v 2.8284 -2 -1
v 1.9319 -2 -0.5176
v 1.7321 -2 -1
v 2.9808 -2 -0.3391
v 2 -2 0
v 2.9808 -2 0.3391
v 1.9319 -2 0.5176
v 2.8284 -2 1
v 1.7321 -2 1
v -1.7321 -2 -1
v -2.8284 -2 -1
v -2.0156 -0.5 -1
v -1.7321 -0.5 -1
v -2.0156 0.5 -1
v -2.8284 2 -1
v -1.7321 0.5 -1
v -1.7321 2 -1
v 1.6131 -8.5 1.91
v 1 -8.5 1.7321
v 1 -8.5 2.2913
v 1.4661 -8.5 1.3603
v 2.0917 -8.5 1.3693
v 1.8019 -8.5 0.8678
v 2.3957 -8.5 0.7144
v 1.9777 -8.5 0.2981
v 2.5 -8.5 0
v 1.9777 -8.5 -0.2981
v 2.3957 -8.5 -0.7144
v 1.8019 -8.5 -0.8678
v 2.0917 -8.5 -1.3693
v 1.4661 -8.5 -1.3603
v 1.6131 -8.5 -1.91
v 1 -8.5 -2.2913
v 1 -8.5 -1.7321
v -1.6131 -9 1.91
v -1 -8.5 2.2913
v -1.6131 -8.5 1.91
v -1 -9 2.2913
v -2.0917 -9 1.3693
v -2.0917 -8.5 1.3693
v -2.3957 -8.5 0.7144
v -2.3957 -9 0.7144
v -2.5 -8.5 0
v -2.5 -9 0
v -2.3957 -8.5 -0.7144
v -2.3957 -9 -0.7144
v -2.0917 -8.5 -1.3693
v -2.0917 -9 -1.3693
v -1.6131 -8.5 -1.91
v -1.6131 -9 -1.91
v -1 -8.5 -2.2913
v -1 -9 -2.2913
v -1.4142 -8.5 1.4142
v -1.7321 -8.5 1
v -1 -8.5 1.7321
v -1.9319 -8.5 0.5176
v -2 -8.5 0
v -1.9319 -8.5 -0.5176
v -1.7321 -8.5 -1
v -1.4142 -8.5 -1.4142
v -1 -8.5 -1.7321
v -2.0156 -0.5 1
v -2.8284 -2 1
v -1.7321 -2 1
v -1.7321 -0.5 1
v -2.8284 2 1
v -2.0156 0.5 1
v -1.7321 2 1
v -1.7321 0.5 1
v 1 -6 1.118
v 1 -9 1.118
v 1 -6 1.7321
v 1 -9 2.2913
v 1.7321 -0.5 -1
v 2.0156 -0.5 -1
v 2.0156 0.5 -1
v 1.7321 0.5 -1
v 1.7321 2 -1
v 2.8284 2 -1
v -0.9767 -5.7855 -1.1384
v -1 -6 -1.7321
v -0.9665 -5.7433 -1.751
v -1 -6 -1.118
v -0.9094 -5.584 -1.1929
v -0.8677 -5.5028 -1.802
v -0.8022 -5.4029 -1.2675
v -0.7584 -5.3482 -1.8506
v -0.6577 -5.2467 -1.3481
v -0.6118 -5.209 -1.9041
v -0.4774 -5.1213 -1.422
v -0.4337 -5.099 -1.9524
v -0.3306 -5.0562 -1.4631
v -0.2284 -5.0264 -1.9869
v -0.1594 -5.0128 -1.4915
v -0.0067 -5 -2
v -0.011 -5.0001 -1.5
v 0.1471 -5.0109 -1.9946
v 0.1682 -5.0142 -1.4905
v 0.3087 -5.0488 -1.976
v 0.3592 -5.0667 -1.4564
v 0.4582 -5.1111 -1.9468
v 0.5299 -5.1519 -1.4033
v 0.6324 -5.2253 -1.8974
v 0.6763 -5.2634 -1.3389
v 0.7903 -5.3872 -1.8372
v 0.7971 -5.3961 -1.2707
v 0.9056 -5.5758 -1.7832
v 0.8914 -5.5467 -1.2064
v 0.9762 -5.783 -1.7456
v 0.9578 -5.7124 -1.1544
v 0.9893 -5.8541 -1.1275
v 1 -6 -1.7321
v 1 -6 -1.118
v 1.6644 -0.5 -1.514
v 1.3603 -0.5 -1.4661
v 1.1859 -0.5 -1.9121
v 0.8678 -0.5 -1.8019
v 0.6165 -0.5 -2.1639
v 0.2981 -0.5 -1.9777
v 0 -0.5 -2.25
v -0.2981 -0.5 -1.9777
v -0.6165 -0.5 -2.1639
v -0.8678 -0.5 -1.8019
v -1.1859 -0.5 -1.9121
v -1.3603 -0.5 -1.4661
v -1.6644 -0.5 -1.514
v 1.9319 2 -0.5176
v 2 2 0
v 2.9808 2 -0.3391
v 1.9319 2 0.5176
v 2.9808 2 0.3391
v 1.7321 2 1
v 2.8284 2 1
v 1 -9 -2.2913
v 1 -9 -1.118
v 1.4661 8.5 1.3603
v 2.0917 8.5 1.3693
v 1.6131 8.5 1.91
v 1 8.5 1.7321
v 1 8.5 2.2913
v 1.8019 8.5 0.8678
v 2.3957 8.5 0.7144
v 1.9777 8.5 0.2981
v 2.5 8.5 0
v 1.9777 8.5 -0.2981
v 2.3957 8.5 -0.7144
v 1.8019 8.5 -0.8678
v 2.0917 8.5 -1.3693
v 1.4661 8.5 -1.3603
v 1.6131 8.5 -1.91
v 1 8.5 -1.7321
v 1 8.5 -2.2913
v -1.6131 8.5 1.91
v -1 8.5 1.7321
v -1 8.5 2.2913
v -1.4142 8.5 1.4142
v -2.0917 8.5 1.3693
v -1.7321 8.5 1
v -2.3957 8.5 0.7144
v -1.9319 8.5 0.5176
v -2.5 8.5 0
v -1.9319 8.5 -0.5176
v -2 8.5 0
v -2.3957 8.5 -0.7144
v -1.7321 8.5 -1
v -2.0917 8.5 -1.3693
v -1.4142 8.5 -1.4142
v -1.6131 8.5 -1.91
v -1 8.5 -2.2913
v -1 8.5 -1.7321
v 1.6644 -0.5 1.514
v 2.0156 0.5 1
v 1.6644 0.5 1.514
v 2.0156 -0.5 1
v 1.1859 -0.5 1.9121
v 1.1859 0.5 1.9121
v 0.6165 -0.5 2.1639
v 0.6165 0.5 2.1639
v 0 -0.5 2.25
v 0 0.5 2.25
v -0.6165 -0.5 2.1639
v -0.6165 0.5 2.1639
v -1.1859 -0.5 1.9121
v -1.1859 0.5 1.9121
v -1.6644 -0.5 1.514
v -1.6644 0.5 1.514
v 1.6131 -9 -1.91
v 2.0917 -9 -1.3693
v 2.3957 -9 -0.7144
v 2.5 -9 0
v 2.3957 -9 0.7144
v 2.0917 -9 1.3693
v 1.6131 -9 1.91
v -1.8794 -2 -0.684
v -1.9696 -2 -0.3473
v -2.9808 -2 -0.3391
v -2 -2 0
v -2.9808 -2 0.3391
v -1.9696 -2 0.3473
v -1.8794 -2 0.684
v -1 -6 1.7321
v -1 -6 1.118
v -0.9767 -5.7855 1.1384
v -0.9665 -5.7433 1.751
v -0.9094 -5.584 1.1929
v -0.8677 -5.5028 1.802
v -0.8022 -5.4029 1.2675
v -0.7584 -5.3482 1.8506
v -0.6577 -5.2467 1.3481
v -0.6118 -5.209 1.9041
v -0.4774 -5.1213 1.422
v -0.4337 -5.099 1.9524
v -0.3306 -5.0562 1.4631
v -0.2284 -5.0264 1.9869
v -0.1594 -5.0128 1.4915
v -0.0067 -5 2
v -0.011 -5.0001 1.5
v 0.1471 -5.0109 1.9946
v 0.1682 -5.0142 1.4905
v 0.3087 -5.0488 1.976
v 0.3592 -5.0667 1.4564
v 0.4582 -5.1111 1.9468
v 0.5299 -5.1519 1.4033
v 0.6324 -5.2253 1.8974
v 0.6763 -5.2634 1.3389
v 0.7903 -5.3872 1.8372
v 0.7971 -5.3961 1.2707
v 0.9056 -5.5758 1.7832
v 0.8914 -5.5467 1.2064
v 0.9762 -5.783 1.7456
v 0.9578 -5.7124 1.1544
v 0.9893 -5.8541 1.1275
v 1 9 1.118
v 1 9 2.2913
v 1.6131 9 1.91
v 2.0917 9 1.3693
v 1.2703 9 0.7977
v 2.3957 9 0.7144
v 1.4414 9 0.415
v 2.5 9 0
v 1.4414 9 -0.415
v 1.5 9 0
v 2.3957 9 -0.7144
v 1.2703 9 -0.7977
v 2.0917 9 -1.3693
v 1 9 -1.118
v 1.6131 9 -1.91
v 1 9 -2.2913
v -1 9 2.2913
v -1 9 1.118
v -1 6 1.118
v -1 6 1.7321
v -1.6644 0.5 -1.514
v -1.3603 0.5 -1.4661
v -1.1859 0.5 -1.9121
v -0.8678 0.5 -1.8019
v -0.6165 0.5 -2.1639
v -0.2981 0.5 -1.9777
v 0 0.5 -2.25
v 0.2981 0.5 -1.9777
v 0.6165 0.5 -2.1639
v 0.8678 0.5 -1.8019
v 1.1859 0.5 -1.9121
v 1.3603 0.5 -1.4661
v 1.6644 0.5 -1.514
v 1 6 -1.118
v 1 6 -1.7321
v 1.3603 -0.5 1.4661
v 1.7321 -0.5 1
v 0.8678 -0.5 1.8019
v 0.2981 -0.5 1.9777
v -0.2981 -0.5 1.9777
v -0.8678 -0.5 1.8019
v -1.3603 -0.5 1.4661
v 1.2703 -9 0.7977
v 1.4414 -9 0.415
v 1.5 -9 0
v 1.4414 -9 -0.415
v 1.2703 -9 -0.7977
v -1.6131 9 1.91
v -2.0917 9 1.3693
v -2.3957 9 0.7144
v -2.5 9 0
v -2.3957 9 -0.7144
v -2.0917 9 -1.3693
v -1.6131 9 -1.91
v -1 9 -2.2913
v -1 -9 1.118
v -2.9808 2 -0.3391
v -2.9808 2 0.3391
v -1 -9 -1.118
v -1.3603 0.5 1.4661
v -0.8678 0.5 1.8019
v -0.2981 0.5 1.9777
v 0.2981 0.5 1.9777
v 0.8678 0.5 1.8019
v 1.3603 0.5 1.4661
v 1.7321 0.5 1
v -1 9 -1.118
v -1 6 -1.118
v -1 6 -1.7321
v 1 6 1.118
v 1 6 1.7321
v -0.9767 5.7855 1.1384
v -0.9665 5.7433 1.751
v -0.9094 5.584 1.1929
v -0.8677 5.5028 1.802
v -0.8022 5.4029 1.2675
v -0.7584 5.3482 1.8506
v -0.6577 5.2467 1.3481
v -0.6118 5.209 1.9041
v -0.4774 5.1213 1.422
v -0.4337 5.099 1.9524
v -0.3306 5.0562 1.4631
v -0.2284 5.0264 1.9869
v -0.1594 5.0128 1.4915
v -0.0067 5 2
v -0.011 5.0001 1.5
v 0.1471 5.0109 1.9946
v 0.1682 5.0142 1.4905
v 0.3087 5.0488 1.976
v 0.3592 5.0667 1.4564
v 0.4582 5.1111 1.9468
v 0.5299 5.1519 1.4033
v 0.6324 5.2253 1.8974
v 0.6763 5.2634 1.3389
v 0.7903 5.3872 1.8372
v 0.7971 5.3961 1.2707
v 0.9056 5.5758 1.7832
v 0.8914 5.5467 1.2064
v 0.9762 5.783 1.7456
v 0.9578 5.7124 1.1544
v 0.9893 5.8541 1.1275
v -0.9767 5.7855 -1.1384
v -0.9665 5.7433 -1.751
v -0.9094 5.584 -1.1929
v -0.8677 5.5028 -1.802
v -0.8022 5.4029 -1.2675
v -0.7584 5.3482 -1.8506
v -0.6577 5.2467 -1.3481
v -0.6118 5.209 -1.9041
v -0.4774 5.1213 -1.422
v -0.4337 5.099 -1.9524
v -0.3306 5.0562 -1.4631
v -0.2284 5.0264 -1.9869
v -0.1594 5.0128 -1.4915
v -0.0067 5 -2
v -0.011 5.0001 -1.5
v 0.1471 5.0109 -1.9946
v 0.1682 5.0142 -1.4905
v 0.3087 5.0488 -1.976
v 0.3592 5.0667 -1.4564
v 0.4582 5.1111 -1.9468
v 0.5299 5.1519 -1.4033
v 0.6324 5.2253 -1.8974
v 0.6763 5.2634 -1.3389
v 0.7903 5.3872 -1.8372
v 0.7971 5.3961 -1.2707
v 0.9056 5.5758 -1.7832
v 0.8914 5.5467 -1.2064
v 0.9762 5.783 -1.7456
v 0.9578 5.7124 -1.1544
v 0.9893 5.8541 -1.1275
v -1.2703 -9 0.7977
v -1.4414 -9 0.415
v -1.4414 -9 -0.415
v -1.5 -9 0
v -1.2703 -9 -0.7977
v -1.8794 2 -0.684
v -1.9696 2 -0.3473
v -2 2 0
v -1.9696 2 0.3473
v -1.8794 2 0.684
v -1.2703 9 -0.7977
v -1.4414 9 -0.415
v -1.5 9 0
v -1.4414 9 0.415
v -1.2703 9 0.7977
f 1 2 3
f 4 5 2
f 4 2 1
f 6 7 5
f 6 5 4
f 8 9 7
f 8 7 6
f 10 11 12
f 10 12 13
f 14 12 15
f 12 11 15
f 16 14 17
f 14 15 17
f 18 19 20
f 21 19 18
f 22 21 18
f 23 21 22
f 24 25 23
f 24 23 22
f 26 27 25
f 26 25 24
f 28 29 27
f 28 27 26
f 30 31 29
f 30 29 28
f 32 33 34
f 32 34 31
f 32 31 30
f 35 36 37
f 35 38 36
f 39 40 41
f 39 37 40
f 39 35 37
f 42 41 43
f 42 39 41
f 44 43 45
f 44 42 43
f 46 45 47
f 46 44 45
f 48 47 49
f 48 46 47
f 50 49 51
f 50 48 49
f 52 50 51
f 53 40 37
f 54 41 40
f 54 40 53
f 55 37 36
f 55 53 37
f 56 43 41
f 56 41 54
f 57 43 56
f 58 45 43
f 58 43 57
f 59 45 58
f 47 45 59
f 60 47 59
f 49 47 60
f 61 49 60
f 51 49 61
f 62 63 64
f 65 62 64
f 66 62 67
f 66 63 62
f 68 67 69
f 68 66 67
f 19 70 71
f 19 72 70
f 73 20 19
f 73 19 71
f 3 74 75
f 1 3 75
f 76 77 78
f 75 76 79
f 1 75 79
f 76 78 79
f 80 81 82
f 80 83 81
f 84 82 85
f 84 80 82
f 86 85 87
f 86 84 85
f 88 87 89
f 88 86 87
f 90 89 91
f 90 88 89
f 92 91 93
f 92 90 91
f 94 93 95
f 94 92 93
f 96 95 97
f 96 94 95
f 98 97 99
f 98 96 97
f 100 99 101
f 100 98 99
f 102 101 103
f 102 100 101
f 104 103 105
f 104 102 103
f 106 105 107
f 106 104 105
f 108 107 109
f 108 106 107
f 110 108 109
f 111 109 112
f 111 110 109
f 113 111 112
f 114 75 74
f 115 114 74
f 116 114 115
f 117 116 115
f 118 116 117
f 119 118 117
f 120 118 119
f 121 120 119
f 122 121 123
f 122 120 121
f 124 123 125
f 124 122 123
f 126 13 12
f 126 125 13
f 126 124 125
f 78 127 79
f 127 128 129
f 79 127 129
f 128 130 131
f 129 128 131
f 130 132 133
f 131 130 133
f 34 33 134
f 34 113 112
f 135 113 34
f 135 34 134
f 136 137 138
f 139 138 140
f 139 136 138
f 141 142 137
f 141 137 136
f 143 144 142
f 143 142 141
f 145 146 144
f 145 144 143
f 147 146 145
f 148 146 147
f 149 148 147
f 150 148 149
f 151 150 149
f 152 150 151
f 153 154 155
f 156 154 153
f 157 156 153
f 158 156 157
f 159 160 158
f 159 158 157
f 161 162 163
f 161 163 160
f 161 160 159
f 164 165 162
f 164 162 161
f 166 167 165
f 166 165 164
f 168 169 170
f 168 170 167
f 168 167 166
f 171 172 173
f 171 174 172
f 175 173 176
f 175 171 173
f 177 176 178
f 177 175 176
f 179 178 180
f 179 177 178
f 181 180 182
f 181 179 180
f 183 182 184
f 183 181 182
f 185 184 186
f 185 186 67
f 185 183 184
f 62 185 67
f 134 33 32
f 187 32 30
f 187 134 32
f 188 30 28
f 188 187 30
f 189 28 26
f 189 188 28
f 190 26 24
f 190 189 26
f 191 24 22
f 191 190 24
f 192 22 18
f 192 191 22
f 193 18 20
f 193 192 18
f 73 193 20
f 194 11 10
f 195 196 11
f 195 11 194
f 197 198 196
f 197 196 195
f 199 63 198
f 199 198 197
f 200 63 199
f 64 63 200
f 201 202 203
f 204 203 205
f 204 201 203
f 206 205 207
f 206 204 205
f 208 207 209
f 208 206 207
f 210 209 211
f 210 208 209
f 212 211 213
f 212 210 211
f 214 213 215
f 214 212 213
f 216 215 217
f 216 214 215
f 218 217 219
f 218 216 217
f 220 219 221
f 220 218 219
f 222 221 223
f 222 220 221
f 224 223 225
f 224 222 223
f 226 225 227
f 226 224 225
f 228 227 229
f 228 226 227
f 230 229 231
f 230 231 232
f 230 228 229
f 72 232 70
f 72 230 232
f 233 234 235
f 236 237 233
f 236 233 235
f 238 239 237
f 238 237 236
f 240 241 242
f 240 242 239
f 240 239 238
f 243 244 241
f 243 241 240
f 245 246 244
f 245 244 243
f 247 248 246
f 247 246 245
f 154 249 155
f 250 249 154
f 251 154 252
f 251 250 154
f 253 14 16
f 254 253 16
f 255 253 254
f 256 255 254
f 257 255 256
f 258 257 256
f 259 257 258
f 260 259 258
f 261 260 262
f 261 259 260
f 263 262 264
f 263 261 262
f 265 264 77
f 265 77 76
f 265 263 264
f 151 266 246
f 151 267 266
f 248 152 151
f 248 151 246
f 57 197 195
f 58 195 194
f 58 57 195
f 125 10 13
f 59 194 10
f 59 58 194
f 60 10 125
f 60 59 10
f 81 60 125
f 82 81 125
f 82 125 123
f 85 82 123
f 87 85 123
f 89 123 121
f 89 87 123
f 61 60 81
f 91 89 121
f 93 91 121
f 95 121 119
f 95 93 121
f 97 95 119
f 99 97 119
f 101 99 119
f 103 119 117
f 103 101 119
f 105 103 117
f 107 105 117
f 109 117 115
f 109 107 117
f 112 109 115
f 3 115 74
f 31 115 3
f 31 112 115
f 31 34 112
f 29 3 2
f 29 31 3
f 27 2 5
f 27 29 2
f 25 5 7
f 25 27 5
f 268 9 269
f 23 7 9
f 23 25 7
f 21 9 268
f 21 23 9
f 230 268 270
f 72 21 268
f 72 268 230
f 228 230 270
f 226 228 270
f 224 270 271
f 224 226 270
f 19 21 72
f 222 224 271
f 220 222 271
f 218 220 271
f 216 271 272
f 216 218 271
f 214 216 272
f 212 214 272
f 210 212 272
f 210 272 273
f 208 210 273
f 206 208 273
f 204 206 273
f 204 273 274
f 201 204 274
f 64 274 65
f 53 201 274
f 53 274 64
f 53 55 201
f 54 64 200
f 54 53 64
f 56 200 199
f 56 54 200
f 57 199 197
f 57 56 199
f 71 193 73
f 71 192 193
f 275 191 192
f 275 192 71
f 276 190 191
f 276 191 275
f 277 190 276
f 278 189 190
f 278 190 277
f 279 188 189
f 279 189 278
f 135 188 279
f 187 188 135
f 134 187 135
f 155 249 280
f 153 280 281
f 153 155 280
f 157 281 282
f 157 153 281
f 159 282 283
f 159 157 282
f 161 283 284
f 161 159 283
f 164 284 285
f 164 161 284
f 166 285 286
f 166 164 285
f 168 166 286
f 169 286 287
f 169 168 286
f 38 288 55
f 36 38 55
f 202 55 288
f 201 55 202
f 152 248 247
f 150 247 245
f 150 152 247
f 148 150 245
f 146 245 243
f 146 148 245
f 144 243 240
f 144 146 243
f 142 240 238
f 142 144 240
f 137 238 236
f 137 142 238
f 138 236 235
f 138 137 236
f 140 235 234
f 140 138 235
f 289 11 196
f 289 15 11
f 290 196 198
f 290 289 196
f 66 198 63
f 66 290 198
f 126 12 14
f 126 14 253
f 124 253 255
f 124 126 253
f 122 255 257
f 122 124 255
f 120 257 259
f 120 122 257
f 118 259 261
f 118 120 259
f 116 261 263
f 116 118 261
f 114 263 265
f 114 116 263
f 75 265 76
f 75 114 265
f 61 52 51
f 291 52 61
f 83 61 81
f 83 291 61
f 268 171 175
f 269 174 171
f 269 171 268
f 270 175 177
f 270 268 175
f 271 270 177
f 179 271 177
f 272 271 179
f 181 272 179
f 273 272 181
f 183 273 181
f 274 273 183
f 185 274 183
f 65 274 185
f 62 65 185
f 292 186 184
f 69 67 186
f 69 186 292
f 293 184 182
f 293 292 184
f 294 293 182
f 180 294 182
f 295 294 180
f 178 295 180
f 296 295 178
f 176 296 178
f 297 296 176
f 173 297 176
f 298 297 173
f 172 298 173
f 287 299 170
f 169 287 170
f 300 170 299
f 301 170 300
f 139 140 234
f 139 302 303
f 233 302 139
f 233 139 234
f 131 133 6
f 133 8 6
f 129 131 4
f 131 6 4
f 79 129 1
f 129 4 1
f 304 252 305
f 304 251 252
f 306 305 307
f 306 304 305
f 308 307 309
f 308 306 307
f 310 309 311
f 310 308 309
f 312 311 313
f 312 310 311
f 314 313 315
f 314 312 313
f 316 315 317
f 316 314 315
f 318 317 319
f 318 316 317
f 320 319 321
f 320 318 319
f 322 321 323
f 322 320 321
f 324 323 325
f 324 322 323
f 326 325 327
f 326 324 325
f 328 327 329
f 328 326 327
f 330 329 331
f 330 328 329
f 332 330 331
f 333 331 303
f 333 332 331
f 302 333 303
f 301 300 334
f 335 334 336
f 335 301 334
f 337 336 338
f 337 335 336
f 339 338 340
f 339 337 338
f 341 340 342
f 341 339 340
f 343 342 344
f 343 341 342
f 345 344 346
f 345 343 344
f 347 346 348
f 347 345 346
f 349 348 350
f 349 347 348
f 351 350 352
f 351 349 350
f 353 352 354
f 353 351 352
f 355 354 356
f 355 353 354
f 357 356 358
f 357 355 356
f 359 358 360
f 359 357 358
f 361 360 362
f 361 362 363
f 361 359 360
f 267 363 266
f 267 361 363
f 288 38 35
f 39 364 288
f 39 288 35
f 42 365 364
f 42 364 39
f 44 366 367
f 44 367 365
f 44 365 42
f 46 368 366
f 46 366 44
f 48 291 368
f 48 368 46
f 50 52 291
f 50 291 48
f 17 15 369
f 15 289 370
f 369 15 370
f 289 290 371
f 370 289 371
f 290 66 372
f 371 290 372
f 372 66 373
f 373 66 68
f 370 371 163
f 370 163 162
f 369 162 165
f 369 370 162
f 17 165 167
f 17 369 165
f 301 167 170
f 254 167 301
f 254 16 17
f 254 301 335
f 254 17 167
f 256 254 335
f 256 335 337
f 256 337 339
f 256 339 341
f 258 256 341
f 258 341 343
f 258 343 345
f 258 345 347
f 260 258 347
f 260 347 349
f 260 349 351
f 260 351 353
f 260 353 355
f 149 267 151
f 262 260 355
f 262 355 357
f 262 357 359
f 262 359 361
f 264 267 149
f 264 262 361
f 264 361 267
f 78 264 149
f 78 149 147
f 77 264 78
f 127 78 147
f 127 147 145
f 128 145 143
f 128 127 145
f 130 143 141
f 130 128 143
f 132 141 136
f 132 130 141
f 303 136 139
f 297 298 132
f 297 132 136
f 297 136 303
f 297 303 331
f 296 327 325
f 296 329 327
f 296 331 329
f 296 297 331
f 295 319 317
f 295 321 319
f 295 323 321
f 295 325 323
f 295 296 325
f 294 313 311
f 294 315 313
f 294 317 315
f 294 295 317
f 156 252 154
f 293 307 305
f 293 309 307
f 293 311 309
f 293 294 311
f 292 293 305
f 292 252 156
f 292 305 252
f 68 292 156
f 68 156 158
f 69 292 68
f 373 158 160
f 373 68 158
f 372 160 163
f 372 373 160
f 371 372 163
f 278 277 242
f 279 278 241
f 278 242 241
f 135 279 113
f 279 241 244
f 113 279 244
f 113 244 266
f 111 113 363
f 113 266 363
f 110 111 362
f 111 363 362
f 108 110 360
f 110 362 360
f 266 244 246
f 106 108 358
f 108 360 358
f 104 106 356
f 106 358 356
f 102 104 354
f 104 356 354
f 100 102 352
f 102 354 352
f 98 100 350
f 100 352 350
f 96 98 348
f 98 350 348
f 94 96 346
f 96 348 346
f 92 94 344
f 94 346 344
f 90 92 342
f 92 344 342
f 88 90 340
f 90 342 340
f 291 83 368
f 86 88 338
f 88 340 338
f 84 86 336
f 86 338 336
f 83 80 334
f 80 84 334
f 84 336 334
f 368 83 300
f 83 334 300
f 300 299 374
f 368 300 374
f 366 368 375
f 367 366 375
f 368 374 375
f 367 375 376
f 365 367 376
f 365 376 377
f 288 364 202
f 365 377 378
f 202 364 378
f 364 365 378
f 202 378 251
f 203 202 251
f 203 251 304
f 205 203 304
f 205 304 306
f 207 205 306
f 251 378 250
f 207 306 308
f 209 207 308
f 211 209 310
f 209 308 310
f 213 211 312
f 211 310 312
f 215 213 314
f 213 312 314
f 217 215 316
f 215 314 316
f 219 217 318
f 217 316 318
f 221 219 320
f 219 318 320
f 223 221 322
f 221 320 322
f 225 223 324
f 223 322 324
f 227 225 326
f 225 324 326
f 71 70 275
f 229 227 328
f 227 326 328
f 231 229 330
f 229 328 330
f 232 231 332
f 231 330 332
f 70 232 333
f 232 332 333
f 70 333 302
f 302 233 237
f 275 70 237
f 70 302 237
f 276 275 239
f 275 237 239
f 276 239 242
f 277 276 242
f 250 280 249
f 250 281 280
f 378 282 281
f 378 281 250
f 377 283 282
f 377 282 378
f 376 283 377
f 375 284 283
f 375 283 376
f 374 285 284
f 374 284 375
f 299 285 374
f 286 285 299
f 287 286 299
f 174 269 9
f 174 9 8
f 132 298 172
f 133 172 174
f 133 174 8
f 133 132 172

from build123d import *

# Parameters (mm, degrees)
SKETCH3_W               = 6
SKETCH3_H               = 4
BOSS_EXTRUDE4_DEPTH     = 1
CUT_EXTRUDE2_DEPTH      = 3.5
CUT_EXTRUDE2_DEPTH_BACK = 3.5
SKETCH6_R               = 1.5
CUT_EXTRUDE3_DEPTH      = 18
SKETCH7_OUTSIDE_W       = 11.904
SKETCH7_OUTSIDE_H       = 10.486
SKETCH7_OUTSIDE_R       = 3
CUT_EXTRUDE4_DEPTH      = 10.0000001
CUT_EXTRUDE4_DEPTH_BACK = 10.0000001


with BuildPart() as part:
    # Sketch1 → Revolve5 (revolve)
    with BuildSketch(Plane.XY):
        Polygon((0, 9), (-2.5, 9), (-2.5, 8.5), (-2, 8.5), (-2, 0.5), (-2.25, 0.5), (-2.25, -0.5), (-2, -0.5), (-2, -8.5), (-2.5, -8.5), (-2.5, -9), (0, -9), align=None)
    revolve(axis=Axis((0, 9, 0), (0, -1, 0)))

    # Sketch3 → Boss-Extrude4 (add, symmetric)
    with BuildSketch(Plane.XY):
        Rectangle(SKETCH3_W, SKETCH3_H)
    extrude(amount=BOSS_EXTRUDE4_DEPTH, both=True)

    # Sketch5 → Cut-Extrude2 (cut, two sides)
    with BuildSketch(Plane.XY) as cut_extrude2_sk:
        with BuildLine():
            Line((-1, 9), (-1, 6))
            ThreePointArc((-1, 6), (0, 5), (1, 6))
            Line((1, 6), (1, 9))
            Line((1, 9), (-1, 9))
        make_face()
        with BuildLine():
            Line((-1, -9), (-1, -6))
            ThreePointArc((-1, -6), (0, -5), (1, -6))
            Line((1, -6), (1, -9))
            Line((1, -9), (-1, -9))
        make_face()
    extrude(amount=CUT_EXTRUDE2_DEPTH, mode=Mode.SUBTRACT)
    extrude(cut_extrude2_sk.sketch, amount=-CUT_EXTRUDE2_DEPTH_BACK, mode=Mode.SUBTRACT)

    # Sketch6 → Cut-Extrude3 (cut)
    with BuildSketch(Plane(origin=(0, 9, 0), x_dir=(1, 0, 0), z_dir=(0, 1, 0))):
        Circle(SKETCH6_R)
    extrude(amount=-CUT_EXTRUDE3_DEPTH, mode=Mode.SUBTRACT)

    # Sketch7 outside → Cut-Extrude4 (cut, two sides)
    with BuildSketch(Plane(origin=(0, 0, 0), x_dir=(1, 0, 0), z_dir=(0, 1, 0))) as cut_extrude4_sk:
        Rectangle(SKETCH7_OUTSIDE_W, SKETCH7_OUTSIDE_H)
        Circle(SKETCH7_OUTSIDE_R, mode=Mode.SUBTRACT)
    extrude(amount=CUT_EXTRUDE4_DEPTH, mode=Mode.SUBTRACT)
    extrude(cut_extrude4_sk.sketch, amount=-CUT_EXTRUDE4_DEPTH_BACK, mode=Mode.SUBTRACT)


solid = part.part
